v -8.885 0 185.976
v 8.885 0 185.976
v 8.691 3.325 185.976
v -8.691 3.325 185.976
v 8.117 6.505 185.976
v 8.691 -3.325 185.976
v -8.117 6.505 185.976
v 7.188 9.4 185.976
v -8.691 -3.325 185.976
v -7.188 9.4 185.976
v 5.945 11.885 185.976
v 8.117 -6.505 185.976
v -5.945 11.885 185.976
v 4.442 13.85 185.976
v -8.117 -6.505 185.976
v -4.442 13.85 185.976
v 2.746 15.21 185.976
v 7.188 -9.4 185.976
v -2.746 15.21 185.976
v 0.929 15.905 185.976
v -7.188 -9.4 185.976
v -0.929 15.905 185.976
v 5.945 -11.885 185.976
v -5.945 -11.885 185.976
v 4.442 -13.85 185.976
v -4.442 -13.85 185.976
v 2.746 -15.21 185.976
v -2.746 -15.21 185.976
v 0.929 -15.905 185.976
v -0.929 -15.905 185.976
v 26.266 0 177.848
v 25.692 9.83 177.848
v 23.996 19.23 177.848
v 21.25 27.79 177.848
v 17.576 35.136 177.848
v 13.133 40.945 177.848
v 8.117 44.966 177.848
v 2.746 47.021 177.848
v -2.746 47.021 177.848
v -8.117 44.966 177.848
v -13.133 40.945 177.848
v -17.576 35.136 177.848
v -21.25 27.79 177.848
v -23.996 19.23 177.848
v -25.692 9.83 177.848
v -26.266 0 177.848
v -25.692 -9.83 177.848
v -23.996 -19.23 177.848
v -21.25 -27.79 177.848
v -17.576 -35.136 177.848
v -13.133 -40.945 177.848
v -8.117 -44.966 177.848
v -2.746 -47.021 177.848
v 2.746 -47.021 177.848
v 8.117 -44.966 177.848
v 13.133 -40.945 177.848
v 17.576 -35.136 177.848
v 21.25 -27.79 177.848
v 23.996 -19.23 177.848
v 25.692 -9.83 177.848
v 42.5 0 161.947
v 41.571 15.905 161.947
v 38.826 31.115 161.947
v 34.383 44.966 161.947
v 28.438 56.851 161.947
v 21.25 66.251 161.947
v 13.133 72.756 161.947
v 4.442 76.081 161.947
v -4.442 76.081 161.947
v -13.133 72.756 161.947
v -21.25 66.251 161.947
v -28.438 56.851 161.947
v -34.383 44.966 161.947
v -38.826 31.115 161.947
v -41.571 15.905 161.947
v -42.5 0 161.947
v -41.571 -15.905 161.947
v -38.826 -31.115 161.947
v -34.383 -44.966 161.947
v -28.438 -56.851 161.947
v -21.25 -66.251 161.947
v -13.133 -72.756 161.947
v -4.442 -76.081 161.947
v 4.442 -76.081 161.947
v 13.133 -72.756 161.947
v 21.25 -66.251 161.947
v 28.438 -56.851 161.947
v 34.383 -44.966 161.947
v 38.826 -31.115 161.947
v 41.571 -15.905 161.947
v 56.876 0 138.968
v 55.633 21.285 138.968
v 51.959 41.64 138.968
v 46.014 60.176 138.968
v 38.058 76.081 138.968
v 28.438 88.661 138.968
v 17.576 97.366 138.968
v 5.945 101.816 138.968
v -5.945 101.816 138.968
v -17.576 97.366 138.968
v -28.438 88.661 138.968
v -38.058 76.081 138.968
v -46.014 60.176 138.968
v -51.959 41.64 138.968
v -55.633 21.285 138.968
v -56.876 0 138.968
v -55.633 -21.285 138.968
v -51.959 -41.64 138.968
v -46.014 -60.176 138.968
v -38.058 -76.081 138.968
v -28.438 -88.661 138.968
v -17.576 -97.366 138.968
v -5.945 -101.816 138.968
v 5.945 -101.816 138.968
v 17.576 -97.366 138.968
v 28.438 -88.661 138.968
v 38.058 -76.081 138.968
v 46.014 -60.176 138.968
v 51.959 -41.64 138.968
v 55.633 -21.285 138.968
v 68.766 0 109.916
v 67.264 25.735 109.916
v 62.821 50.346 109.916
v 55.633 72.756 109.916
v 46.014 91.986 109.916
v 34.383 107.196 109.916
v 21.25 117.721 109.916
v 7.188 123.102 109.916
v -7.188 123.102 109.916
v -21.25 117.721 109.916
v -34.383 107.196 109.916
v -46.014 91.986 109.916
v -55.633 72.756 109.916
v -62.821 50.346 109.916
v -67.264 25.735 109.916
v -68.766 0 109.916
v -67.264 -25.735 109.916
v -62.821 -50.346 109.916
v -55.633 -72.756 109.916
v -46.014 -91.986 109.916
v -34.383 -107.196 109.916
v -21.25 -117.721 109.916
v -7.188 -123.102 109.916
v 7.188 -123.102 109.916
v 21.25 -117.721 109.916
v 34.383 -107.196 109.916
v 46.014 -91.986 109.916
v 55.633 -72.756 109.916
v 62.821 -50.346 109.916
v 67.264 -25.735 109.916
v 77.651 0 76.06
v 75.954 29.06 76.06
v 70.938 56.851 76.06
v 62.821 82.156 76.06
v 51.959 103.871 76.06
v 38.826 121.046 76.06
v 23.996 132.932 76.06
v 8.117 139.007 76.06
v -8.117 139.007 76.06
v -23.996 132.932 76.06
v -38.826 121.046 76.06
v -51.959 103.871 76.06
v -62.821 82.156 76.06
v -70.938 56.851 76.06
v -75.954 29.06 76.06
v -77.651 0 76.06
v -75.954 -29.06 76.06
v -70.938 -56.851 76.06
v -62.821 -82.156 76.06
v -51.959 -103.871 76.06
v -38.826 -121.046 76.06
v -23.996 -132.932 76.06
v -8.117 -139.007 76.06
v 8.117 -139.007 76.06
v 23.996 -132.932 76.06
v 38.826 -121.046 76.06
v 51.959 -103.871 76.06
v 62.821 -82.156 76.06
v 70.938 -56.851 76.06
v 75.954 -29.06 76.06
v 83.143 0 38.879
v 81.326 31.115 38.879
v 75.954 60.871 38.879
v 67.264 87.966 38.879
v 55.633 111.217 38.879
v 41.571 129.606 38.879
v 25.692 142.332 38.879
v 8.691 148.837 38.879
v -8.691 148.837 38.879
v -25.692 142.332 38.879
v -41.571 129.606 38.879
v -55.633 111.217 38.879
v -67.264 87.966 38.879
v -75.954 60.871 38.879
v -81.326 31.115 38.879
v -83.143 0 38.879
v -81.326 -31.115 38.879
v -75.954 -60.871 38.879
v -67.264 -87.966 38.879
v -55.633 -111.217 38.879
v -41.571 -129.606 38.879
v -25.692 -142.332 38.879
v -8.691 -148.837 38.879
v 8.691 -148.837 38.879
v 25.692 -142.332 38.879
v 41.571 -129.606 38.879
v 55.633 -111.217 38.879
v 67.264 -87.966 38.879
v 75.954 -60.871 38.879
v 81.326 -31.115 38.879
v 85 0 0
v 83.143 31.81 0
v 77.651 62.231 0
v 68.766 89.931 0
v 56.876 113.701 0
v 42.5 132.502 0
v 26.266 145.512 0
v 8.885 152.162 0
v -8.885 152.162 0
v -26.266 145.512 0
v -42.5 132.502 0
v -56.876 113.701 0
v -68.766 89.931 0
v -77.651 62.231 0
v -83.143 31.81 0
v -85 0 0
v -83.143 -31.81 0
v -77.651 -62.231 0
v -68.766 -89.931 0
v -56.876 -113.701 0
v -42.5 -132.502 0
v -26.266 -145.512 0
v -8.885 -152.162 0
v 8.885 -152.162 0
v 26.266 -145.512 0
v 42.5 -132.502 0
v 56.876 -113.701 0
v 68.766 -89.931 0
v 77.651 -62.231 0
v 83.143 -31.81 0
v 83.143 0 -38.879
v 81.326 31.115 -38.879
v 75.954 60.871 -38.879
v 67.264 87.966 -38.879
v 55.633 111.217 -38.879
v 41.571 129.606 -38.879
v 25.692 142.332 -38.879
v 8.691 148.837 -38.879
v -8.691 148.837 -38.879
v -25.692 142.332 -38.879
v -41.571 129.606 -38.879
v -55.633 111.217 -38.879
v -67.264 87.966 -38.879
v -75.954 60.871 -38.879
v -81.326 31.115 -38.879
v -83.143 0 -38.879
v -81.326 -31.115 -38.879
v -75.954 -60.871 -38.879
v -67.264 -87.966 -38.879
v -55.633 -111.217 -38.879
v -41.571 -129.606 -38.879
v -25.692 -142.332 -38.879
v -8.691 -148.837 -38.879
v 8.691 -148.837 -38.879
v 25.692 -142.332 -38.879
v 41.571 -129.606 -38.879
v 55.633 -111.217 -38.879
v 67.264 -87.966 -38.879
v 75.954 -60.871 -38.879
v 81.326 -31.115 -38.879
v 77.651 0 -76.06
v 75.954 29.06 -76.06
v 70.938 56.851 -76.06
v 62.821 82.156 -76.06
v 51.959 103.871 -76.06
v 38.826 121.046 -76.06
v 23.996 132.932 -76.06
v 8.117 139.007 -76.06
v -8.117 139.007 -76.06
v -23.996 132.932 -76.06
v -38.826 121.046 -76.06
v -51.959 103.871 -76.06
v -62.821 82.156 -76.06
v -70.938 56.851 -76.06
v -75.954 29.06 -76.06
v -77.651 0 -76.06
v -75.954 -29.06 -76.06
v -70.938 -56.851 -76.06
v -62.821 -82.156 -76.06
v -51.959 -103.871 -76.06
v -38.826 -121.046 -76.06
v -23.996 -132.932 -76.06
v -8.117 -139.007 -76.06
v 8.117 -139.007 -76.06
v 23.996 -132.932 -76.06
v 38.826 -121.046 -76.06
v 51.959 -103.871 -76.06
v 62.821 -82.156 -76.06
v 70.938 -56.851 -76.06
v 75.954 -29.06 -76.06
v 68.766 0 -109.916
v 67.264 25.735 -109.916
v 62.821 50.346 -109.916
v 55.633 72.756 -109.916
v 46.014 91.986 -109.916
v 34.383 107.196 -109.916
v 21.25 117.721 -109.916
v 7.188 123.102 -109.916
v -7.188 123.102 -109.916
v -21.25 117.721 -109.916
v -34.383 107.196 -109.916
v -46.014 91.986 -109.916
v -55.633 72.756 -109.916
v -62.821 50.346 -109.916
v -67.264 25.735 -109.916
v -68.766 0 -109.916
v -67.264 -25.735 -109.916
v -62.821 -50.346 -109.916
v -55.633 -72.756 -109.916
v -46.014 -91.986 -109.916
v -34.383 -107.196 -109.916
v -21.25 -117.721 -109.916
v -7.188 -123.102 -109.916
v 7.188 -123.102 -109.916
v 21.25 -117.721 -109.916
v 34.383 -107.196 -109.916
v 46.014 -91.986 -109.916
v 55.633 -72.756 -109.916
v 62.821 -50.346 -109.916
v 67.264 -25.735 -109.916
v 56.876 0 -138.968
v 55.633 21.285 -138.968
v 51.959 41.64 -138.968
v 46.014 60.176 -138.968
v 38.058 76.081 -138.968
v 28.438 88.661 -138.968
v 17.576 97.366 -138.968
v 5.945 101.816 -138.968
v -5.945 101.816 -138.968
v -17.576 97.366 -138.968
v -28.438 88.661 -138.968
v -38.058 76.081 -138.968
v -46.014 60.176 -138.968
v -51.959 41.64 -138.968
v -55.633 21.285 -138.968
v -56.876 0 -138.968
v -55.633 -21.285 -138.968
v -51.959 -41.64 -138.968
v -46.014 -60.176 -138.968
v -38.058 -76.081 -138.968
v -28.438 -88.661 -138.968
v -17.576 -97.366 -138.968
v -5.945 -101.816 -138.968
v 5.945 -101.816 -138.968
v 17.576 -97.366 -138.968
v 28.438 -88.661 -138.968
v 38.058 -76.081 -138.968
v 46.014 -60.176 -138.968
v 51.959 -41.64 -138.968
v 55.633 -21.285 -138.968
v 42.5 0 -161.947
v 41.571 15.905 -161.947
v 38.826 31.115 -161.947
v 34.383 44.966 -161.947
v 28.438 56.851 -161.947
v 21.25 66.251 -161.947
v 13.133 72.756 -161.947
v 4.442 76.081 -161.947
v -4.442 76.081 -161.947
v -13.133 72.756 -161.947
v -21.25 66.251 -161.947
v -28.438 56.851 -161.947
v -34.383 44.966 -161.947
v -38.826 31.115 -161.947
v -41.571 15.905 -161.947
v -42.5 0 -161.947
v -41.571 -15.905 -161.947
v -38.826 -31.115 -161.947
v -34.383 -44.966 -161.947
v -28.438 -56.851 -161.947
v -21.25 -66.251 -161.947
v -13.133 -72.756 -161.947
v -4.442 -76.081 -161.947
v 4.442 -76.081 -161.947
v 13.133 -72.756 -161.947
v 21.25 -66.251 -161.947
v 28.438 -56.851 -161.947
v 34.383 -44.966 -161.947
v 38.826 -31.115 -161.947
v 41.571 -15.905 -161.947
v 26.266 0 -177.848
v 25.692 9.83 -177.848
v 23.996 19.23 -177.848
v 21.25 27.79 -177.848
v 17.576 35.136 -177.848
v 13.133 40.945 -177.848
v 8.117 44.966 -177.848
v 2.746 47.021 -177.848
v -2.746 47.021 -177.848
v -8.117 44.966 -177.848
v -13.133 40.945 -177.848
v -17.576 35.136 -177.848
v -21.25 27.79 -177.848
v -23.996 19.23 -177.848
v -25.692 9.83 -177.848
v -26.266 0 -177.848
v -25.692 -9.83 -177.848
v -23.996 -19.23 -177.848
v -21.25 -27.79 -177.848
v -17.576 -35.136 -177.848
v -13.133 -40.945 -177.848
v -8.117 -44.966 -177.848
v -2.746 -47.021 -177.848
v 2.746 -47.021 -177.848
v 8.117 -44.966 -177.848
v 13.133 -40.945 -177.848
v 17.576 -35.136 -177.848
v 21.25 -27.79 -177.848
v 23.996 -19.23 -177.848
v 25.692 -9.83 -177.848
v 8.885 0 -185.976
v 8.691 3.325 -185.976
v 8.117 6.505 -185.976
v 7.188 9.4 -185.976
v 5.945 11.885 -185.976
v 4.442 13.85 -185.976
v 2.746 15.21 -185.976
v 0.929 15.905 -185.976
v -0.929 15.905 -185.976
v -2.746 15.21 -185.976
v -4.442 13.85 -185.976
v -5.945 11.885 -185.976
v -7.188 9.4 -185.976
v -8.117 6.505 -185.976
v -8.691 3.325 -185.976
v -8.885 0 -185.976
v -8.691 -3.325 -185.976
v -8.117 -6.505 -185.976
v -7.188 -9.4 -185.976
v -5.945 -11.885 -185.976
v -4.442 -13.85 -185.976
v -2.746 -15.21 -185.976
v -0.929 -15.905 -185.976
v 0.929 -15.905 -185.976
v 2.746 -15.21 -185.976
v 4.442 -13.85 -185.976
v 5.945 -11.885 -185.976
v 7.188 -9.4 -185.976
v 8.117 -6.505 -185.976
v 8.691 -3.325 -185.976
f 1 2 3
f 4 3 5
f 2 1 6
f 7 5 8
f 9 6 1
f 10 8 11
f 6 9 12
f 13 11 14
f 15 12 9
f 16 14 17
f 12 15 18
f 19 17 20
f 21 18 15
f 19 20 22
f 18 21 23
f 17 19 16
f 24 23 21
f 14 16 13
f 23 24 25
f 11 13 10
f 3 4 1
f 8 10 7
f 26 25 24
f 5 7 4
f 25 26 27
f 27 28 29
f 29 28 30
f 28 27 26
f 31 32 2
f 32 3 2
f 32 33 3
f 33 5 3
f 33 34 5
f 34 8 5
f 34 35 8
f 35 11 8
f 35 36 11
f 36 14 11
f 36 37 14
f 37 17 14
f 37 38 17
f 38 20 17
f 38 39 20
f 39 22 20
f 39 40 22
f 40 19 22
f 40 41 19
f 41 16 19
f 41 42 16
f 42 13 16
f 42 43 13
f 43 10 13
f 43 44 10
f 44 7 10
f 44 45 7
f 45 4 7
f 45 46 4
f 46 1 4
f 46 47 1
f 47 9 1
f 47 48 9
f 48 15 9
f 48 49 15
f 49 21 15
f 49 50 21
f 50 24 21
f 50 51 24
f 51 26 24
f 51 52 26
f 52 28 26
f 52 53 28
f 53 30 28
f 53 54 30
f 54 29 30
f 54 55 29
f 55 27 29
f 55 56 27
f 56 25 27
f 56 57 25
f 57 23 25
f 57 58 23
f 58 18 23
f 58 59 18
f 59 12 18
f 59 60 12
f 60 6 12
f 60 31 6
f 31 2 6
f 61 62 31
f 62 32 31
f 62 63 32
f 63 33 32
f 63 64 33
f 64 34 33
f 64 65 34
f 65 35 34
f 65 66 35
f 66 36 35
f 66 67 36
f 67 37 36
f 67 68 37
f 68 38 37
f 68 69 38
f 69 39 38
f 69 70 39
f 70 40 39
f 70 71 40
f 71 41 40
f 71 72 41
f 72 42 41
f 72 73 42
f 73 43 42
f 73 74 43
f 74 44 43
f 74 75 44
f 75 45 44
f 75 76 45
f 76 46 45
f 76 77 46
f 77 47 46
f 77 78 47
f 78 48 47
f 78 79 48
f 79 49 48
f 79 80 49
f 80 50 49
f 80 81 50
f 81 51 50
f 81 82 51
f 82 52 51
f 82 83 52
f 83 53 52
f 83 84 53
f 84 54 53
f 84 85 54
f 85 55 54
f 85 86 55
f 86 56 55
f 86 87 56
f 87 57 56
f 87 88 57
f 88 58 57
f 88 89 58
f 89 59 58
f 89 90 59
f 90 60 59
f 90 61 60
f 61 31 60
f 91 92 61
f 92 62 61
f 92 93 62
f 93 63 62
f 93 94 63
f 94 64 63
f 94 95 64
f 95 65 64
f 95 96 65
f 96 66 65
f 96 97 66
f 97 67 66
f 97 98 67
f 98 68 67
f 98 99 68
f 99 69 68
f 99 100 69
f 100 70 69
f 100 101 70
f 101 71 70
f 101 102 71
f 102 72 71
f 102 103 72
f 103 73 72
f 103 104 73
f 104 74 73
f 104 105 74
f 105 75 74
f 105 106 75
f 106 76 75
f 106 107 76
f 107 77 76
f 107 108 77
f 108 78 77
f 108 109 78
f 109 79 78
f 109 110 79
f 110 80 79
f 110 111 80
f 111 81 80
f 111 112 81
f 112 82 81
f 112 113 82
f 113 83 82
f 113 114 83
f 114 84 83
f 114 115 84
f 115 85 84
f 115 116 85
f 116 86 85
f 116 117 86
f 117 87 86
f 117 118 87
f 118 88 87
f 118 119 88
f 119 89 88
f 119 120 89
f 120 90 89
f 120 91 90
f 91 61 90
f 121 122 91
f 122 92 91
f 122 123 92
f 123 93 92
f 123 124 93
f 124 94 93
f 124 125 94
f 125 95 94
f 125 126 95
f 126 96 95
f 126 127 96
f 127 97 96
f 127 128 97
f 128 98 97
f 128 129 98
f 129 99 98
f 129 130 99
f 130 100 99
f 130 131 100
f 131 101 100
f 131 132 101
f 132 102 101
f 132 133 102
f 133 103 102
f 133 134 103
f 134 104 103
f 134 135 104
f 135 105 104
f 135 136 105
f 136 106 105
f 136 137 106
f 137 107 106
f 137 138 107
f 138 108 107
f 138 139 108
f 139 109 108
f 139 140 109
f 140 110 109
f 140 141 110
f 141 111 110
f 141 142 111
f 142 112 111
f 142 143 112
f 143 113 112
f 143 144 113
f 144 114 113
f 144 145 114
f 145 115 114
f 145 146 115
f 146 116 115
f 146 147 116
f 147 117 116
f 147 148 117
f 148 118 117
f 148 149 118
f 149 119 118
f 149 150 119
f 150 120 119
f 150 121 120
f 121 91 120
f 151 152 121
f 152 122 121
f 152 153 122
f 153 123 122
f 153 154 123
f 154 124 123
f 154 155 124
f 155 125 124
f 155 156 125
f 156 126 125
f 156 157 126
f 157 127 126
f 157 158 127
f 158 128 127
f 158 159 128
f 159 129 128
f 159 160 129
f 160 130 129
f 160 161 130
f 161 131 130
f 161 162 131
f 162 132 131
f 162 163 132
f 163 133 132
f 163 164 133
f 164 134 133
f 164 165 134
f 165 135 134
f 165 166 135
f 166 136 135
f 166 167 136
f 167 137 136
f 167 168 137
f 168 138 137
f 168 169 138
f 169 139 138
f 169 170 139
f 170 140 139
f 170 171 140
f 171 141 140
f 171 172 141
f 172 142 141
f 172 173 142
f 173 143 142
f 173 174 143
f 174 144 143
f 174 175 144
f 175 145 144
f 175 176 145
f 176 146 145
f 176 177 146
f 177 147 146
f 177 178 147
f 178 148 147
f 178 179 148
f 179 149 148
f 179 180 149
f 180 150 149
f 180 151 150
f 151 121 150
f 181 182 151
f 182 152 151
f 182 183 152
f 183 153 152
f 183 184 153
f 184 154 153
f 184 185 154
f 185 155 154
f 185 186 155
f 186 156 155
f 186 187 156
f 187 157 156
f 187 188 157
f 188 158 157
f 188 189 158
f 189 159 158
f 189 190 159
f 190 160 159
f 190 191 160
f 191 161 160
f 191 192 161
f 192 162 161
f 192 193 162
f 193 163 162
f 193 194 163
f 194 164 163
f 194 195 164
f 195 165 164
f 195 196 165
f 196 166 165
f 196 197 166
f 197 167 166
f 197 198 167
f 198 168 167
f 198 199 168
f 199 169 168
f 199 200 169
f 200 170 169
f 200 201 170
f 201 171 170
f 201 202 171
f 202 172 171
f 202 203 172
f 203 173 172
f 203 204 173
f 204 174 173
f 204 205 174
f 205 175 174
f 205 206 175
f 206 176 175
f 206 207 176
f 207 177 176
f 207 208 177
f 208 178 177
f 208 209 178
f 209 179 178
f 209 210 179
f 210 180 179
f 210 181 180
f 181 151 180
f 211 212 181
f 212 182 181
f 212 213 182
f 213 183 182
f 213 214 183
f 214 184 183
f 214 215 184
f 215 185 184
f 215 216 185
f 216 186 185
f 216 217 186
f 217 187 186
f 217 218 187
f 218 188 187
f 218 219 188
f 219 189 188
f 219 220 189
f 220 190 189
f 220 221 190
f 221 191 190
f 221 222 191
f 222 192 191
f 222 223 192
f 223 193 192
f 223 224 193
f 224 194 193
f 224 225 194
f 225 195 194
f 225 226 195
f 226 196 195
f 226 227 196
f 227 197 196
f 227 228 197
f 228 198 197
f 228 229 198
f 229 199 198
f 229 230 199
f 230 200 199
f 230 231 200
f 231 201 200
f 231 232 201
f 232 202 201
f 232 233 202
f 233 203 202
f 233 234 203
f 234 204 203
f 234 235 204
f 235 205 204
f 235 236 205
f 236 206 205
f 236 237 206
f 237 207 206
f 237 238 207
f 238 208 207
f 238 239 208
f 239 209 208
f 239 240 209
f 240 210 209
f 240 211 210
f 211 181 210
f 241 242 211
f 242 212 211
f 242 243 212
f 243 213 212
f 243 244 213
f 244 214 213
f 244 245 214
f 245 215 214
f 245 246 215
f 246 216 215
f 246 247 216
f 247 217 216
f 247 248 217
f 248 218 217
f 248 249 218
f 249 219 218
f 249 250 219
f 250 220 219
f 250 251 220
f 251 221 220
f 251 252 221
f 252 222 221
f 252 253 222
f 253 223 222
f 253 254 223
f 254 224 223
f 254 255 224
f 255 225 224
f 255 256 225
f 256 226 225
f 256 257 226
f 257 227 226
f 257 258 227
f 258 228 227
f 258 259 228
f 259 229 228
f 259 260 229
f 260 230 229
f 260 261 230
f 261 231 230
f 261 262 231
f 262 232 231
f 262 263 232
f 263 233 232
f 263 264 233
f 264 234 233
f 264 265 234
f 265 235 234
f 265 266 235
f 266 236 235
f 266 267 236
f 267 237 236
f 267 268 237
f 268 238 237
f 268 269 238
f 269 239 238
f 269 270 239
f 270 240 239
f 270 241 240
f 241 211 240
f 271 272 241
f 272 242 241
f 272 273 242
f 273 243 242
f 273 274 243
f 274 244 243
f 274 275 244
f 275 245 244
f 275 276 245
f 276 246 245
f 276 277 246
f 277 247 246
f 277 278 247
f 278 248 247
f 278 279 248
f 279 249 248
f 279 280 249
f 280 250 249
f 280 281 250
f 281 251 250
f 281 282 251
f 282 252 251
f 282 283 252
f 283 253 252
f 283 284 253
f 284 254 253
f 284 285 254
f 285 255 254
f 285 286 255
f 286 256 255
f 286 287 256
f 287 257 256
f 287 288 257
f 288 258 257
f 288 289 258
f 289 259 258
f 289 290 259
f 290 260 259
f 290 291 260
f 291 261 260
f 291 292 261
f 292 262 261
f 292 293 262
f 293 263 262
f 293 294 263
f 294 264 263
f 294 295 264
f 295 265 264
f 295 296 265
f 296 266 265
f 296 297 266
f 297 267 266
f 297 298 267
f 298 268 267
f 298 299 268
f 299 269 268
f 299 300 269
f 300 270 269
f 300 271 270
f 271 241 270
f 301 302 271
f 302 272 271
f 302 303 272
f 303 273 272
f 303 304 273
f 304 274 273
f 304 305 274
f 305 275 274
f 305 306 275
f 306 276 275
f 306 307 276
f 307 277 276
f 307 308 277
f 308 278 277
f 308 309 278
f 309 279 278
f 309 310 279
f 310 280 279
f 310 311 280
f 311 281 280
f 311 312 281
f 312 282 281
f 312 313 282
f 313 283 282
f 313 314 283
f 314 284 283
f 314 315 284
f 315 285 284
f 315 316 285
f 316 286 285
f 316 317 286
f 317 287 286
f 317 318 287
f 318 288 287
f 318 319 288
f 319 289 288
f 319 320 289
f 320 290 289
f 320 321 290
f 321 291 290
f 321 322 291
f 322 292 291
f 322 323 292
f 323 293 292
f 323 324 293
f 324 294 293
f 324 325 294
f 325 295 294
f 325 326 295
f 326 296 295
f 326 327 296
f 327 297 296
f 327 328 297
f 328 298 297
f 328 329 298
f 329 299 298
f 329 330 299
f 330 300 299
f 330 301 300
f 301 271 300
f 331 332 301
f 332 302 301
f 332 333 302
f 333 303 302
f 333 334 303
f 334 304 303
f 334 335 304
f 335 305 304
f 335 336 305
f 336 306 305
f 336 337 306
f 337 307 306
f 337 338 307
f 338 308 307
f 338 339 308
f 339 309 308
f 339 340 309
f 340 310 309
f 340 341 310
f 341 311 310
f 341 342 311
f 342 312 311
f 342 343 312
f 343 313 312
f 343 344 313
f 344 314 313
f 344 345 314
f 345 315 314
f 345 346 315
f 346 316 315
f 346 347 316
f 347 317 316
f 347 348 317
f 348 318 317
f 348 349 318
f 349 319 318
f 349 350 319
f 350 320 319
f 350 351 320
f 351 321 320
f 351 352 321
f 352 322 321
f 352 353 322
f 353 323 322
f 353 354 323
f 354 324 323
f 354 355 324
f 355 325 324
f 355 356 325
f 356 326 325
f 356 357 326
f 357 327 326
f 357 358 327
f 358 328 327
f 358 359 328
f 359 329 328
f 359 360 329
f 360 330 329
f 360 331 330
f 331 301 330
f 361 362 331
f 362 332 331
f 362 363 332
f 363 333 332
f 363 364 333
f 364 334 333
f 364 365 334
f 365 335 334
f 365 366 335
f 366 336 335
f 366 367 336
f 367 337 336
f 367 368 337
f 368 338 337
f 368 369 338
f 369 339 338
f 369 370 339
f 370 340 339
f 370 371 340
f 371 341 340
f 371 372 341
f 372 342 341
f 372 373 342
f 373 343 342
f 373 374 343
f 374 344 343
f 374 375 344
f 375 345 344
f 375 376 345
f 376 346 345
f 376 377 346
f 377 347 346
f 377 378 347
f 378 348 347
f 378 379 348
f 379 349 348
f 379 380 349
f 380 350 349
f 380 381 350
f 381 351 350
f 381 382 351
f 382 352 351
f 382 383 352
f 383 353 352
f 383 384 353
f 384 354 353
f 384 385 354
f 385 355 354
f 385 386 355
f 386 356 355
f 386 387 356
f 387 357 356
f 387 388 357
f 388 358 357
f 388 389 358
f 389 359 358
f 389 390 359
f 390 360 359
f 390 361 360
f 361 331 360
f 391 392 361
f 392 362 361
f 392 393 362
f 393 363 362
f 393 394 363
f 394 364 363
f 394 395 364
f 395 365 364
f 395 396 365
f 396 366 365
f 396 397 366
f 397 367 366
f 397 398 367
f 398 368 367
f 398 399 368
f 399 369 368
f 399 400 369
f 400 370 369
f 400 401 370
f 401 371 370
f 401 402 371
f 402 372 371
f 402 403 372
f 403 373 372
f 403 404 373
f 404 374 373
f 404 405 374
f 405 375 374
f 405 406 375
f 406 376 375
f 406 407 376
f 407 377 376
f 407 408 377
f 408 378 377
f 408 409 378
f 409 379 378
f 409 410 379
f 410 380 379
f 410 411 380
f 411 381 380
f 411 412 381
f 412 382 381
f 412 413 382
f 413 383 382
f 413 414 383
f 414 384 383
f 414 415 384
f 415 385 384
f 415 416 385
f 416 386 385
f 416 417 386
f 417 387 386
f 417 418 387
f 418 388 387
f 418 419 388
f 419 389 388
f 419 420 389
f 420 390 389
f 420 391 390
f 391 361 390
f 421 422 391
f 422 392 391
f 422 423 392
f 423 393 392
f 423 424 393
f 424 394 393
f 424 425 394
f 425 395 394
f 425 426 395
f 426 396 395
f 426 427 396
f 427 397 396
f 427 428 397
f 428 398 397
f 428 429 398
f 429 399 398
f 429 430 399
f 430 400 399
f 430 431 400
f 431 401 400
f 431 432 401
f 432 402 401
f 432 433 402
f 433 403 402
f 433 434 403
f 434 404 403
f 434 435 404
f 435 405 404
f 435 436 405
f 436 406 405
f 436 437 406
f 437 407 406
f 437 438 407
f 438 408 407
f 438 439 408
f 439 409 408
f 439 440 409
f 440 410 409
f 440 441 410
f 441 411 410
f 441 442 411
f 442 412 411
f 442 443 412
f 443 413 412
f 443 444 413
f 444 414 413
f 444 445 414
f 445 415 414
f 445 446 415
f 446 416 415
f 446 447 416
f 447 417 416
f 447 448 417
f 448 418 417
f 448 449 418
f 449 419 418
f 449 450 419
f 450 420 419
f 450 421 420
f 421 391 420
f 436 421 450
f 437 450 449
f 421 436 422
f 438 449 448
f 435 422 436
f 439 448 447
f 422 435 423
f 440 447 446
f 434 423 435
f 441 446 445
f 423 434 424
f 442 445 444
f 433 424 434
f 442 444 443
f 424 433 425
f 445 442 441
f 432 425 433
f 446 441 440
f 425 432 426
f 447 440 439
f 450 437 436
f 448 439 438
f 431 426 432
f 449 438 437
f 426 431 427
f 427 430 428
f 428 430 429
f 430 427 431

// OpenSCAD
// Generated by SolidPython 1.0.1 on 2020-07-29 00:46:46


scale(v = [5, 9, 11]) {
	sphere(r = 17);
}
/***********************************************
*********      SolidPython code:      **********
************************************************
 
# import packages: SolidPython
from solid import *
from solid.utils import *
from itertools import chain, combinations, permutations


class Resize:

    def __init__(self, scad_file):
        self.scad_file = scad_file
        #self.scad_file = import_scad(scad_file)
        # cone/cylinder param:
        self.r1 = 0
        self.r2 = 0
        self.h = 0
        # rectangular prism param:
        self.w = 0
        self.l = 0
        # ellipse param:
        self.r = 0

    # import OpenScad code (file name corresponds to shape)


    # classify shape + parameters
    def assign(self, param1, param2, param3):
        if self.scad_file == 'cone.scad':
            self.r1 = param1
            self.r2 = param2
            self.h = param3
        elif self.scad_file == 'cylinder.scad':
            self.r1 = param1
            self.r2 = param2
            self.h = param3
        elif self.scad_file == 'rectangularPrism.scad':
            self.h = param1
            self.l = param2
            self.w = param3
        else:
            self.r = param1
            self.h = param2

    # resize parameters
    def iterate(self):
        x = range(3, 20, 2)
        i = 1
        if self.scad_file == 'cone.scad':
            tempList = list(permutations(x, 2))
            for temp in tempList:
                param1 = temp[0]
                param2 = temp[1]
                filepath = 'produced_scad_files/' + 'cone' + str(param1) + '_' + str(param2) + '_' + '.scad'
                scad_render_to_file(cylinder(h=param1, r1=param2, r2=0), filepath)

        elif self.scad_file == 'cylinder.scad':
            tempList = list(permutations(x, 3))
            for temp in tempList:
                param1 = temp[0]
                param2 = temp[1]
                filepath = 'produced_scad_files/' + 'cylinder' + str(param1) + '_' + str(param2) + '_' + '.scad'
                scad_render_to_file(cylinder(h=param1, r1=param2, r2=param2), filepath)

        elif self.scad_file == 'rectangularPrism.scad':
            tempList = list(permutations(x, 3))
            for temp in tempList:
                param1 = temp[0]
                param2 = temp[1]
                param3 = temp[2]
                filepath = 'produced_scad_files/' + 'rectangularPrism' + str(param1) + '_' + str(param2) + '_' + str(
                    param3) + '.scad'
                scad_render_to_file(cube(size=(param1, param2, param3)), filepath)

        elif self.scad_file == 'ellipse.scad':
            tempList = list(permutations(x, 4))
            for temp in tempList:
                param1 = temp[0]
                param2 = temp[1]
                param3 = temp[2]
                param4 = temp[3]
                filepath = 'produced_scad_files/' + 'ellipse' + str(param1) + '_' + str(param2) + '_' + str(param3) + '_' + str(param4) + '.scad'
                scad_render_to_file(scale([param1, param2, param3])(sphere(r=param4)), filepath)

    def render_to_scadfile(self):
        scad_render_to_file(scad, 'example.scad') 
 
************************************************/
